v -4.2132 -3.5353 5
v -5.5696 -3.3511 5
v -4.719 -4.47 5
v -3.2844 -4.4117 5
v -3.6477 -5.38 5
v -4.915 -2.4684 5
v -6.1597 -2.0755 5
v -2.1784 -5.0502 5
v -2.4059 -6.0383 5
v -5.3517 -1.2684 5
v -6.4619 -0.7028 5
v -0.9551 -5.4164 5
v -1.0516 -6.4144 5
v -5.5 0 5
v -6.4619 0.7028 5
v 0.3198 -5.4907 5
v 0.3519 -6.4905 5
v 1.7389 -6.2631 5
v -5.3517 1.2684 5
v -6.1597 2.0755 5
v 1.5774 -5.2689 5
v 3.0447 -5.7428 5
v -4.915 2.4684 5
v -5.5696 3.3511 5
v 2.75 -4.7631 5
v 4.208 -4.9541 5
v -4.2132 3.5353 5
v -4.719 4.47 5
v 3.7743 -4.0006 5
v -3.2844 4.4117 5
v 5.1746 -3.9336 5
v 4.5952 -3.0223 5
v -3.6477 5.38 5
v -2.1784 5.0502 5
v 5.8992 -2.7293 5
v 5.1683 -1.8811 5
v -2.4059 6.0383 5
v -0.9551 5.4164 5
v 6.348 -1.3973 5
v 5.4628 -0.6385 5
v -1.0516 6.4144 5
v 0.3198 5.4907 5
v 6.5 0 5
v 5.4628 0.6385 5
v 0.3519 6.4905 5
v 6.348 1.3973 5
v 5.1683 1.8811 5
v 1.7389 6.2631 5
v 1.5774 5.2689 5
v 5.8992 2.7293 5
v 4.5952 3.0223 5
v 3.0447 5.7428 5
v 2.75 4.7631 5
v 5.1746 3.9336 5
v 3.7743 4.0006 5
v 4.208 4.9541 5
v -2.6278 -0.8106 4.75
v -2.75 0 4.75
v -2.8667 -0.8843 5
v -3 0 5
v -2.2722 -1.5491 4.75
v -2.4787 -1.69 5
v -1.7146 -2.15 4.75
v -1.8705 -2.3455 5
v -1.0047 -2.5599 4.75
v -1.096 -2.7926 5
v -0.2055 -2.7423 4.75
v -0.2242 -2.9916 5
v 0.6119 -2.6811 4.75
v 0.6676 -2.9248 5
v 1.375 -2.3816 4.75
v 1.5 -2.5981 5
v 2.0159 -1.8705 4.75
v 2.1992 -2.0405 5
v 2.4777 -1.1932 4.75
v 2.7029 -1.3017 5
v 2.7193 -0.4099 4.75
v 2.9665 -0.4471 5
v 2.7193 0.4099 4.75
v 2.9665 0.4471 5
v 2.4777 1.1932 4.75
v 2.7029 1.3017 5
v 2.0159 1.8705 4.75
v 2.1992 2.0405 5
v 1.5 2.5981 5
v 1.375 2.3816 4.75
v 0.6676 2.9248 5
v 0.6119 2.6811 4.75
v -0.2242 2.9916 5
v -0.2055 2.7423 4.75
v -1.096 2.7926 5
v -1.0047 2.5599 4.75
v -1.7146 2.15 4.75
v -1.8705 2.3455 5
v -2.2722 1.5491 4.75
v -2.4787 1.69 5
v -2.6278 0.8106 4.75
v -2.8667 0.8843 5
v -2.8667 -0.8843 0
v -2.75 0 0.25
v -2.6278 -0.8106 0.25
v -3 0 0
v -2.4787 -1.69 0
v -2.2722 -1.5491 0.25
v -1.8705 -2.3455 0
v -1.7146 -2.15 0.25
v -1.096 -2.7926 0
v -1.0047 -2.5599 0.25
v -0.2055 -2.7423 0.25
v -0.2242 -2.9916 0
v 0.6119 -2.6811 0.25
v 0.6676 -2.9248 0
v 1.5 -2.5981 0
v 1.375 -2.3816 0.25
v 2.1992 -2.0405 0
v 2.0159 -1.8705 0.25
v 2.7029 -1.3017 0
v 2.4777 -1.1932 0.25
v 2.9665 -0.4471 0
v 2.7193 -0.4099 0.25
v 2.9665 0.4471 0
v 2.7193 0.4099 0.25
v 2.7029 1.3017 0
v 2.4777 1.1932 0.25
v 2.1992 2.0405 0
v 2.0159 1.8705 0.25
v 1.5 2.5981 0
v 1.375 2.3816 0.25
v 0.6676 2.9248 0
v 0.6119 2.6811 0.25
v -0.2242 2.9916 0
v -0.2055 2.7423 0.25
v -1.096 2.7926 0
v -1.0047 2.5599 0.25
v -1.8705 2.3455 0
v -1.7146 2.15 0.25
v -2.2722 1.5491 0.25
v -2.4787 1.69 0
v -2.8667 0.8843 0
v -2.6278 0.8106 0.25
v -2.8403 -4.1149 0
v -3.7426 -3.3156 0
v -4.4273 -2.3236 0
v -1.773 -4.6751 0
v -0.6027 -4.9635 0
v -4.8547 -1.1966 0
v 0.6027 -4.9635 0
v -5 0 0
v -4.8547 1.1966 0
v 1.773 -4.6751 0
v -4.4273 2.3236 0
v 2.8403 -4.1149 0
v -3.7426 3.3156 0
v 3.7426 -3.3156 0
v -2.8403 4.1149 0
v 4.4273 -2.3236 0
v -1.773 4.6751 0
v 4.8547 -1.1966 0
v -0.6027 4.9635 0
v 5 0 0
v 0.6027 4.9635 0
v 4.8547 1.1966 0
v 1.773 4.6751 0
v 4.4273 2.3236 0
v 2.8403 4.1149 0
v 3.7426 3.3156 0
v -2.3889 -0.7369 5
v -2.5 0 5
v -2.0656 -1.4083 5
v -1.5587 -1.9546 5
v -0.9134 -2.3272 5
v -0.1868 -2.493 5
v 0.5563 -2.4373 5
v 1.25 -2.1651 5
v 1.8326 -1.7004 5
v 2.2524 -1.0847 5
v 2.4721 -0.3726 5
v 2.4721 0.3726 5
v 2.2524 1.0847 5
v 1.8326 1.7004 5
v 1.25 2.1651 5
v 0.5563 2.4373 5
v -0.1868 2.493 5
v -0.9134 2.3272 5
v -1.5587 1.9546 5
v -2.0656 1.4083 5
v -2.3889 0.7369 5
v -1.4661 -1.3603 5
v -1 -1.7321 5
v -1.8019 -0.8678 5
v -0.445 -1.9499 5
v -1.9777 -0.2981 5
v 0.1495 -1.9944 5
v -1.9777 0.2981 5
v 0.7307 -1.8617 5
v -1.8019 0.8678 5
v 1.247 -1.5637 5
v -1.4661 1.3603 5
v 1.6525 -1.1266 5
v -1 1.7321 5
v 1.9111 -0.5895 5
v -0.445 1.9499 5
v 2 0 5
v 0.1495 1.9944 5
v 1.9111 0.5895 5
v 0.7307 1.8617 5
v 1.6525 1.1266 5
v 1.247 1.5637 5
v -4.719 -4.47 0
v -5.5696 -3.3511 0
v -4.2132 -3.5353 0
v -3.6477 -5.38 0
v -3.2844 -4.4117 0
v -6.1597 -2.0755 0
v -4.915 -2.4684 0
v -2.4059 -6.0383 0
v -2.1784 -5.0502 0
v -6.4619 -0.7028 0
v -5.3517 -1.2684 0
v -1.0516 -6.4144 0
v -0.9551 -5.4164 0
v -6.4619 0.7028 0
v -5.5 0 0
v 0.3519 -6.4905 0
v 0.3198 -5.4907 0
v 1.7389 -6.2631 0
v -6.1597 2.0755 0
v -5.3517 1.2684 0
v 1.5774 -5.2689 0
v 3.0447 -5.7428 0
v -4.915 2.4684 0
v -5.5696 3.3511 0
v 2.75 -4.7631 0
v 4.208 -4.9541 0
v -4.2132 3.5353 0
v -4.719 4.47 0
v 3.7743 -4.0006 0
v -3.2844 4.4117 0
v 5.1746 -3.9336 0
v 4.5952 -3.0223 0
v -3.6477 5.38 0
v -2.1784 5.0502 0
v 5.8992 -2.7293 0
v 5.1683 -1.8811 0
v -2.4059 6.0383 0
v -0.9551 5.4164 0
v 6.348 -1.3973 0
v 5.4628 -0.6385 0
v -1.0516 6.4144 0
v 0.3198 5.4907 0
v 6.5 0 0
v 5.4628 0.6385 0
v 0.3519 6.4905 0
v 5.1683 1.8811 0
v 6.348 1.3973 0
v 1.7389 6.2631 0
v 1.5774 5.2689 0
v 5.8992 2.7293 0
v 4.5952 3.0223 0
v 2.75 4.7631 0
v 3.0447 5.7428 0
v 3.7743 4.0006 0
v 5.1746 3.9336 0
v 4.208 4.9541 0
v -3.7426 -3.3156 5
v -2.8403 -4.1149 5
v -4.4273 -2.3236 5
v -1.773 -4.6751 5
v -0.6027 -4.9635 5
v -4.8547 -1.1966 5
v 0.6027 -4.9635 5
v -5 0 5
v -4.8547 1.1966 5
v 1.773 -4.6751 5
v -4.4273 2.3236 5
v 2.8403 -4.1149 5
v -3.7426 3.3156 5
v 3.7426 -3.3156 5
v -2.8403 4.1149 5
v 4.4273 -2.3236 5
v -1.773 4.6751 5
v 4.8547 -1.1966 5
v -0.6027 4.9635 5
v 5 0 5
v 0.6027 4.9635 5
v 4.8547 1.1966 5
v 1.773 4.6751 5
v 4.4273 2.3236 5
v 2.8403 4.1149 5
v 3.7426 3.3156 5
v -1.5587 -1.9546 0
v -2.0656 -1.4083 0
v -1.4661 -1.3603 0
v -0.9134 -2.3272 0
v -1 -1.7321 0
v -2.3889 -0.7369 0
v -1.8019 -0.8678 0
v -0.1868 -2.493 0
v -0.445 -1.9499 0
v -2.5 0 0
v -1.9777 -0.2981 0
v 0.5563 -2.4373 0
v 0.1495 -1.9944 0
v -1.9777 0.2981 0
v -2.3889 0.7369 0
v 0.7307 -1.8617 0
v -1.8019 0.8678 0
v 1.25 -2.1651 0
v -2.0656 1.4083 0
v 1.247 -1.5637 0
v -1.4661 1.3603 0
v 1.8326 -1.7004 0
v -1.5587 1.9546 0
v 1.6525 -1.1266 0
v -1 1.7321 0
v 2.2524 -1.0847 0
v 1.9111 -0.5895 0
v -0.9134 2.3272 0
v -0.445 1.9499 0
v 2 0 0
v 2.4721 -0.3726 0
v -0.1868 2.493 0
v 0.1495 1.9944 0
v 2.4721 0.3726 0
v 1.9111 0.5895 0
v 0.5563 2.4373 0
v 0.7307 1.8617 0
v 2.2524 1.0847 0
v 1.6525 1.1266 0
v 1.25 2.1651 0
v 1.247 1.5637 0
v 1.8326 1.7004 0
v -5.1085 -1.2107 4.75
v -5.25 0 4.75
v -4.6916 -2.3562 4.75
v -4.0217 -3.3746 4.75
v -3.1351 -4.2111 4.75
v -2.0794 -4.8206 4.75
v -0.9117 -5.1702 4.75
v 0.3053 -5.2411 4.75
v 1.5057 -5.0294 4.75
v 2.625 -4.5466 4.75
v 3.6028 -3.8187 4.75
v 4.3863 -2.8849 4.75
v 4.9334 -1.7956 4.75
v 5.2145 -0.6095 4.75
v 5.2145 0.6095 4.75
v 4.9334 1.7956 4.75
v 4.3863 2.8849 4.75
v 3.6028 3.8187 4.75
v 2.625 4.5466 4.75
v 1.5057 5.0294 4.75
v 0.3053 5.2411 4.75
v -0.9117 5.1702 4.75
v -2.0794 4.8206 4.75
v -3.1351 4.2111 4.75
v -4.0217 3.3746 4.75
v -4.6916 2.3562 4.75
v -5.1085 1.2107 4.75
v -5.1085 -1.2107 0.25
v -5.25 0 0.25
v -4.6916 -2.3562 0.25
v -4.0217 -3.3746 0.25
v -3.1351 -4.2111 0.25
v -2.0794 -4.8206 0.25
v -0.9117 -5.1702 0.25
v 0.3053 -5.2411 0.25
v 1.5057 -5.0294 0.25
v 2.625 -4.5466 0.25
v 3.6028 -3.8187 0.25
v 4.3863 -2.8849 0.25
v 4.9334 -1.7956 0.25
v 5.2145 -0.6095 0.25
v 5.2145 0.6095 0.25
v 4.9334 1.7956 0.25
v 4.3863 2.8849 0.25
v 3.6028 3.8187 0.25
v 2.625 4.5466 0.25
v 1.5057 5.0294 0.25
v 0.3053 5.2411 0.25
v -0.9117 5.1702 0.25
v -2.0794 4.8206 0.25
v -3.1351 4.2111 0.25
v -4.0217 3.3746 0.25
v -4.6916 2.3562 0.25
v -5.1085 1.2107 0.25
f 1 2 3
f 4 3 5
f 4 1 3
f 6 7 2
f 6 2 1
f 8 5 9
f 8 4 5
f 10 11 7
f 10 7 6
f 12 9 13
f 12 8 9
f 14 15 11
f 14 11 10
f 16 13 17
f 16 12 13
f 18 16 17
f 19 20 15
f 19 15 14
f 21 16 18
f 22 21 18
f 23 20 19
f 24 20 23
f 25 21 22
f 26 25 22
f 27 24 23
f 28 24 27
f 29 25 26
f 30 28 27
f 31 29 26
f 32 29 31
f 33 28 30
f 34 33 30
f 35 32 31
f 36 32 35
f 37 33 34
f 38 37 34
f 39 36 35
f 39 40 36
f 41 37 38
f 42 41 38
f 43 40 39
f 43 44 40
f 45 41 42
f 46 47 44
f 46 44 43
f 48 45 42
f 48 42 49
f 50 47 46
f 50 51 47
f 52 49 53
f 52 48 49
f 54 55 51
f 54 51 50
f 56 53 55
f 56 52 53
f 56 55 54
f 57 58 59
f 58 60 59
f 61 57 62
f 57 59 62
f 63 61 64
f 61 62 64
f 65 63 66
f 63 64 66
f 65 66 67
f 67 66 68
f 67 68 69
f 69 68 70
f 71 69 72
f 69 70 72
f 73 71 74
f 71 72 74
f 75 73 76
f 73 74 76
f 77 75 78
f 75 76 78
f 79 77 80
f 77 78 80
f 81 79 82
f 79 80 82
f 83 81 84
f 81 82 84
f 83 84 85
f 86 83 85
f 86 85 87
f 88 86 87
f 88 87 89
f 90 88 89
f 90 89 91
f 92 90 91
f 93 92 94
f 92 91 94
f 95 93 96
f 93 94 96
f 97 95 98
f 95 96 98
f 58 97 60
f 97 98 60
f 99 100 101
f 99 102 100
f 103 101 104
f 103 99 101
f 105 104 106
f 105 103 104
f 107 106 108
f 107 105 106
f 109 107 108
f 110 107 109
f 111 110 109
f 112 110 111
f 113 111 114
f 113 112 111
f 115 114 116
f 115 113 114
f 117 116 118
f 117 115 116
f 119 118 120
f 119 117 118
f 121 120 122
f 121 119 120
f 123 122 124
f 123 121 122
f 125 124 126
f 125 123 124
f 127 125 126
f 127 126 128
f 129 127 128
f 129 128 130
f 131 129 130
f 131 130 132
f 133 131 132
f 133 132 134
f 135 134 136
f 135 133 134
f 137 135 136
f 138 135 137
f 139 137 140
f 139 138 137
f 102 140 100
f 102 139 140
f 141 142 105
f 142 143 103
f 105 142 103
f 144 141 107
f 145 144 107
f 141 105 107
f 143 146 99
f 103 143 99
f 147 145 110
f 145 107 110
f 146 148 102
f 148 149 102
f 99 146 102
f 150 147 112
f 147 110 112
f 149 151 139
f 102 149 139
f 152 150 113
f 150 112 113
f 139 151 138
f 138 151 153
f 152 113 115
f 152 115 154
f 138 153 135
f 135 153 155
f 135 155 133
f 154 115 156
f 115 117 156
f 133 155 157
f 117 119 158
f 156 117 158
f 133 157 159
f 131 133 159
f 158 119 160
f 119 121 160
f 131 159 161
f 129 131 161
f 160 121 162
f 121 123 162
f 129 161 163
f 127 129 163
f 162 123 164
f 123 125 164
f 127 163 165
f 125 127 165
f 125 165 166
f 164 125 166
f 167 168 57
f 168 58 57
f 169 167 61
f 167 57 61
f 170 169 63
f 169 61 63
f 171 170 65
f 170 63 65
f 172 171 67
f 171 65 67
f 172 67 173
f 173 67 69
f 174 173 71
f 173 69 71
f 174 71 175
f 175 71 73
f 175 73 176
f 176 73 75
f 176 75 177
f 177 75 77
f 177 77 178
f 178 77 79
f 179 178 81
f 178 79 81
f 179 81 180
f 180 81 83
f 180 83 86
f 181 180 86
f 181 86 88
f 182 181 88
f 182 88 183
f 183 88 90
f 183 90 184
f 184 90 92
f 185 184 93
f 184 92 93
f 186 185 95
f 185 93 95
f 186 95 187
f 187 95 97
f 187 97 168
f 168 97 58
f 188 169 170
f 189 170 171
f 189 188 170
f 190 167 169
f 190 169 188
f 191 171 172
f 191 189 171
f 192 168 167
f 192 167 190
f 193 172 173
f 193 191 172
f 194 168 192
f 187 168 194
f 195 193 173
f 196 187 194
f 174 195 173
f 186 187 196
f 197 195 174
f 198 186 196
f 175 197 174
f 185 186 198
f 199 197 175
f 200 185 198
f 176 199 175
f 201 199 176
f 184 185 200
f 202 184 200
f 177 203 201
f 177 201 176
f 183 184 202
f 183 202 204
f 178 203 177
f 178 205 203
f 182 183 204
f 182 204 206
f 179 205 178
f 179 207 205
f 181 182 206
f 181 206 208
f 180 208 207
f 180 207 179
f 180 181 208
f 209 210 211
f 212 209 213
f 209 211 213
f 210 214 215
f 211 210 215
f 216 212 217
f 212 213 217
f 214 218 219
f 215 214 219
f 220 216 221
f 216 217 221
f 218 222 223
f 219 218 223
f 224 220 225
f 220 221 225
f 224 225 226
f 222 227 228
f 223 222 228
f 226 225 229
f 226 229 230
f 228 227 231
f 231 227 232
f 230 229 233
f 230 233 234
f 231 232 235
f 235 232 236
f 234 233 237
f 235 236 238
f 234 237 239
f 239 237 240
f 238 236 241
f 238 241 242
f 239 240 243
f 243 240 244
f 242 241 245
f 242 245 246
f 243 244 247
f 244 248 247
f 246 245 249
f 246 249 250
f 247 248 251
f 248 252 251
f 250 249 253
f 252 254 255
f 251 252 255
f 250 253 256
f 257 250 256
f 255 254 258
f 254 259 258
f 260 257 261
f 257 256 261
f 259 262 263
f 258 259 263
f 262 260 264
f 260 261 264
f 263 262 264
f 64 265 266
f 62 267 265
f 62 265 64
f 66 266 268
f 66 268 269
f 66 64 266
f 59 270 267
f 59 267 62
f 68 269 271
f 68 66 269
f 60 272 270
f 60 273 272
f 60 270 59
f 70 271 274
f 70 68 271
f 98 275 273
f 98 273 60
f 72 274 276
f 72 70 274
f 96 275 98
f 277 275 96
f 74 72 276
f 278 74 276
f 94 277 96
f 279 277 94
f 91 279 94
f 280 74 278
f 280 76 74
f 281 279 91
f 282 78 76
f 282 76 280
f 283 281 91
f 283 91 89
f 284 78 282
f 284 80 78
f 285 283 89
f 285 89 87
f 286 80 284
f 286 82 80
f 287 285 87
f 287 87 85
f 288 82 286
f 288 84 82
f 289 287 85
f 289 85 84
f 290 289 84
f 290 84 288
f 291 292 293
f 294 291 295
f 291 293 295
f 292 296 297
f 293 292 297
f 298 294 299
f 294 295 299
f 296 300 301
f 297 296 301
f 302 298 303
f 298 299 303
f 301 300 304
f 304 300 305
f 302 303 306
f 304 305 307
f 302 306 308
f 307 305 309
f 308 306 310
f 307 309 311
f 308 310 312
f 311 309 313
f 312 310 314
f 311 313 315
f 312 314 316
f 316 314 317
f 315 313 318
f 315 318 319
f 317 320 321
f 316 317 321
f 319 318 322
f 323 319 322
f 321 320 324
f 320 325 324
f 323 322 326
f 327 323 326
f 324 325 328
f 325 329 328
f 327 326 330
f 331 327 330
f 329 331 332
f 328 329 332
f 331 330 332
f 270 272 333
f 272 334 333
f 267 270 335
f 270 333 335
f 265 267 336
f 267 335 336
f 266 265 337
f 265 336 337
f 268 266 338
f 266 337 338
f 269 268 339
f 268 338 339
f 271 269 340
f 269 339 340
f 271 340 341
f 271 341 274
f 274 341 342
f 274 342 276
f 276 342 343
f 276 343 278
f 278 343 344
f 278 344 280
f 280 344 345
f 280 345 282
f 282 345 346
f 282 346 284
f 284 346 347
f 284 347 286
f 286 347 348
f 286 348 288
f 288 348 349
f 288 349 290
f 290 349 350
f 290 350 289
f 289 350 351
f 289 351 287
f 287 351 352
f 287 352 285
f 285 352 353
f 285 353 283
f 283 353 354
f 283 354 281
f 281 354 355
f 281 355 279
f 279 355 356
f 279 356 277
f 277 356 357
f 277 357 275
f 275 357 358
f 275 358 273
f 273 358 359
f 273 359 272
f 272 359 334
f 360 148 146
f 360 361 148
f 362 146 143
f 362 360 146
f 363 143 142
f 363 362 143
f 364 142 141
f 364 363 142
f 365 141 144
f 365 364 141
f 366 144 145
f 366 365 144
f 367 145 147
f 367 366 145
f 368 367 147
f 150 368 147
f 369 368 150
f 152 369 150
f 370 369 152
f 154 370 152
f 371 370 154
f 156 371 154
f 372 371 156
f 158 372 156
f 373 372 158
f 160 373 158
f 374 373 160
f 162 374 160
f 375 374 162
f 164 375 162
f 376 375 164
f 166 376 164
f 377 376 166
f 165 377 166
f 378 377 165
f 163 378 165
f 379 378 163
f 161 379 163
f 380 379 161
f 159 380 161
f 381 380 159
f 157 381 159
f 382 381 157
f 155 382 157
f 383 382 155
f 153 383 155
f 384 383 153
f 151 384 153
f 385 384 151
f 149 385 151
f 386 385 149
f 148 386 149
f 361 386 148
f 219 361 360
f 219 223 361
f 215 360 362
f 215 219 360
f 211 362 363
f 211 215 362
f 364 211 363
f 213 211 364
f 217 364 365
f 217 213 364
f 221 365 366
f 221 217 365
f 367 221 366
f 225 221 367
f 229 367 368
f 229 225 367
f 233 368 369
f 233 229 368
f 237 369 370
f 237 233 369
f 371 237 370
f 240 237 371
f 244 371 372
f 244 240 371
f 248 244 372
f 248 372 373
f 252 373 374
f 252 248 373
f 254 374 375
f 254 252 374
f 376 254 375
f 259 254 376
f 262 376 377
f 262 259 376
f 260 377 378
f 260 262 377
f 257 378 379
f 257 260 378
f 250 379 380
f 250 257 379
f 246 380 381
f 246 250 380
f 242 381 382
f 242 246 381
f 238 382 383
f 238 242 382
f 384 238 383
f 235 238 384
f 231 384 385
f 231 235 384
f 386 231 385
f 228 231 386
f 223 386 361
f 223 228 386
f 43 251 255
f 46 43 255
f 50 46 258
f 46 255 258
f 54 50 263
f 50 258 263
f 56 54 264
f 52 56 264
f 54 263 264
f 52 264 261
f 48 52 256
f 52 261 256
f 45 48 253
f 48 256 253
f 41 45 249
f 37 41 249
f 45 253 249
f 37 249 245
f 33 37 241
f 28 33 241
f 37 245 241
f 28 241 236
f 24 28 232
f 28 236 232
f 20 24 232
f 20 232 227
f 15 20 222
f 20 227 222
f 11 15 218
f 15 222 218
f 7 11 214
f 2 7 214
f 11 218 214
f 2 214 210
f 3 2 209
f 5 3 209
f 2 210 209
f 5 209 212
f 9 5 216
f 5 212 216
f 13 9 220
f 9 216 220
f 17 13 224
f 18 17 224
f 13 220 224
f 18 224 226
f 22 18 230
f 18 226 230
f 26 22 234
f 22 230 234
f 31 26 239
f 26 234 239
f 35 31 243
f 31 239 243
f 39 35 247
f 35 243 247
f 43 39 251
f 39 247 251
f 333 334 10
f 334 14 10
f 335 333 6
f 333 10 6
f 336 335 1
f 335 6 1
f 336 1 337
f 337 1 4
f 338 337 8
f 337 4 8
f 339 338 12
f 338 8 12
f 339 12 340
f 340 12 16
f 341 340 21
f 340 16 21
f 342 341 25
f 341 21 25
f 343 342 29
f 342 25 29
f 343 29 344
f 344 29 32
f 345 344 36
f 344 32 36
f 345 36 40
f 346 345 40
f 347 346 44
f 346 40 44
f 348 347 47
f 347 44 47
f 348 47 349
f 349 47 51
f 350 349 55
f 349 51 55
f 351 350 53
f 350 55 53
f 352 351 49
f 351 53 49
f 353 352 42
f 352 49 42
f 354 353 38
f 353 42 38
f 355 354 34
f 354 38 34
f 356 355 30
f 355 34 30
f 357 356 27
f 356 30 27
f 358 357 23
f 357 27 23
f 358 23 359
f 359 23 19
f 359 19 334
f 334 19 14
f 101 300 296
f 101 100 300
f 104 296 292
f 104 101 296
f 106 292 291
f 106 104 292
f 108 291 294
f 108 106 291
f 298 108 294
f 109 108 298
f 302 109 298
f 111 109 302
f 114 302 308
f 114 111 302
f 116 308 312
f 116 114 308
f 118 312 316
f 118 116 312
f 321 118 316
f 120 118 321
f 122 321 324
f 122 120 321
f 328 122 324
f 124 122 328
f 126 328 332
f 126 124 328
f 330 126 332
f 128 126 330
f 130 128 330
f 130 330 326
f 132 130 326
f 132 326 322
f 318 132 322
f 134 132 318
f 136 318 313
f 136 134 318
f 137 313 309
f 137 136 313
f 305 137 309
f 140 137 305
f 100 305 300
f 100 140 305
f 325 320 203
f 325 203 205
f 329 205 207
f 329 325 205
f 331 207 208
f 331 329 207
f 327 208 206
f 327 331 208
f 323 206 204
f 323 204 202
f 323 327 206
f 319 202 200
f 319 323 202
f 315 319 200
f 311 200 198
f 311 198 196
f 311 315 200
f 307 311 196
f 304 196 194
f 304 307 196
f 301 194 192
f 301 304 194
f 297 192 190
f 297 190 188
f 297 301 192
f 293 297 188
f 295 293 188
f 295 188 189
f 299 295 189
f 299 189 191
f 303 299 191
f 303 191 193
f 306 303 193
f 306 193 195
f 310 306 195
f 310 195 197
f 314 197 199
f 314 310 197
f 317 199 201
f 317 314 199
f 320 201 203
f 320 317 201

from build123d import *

# Parameters (mm, degrees)
SKETCH1_R           = 6.5
SKETCH1_R_2         = 2
BOSS_EXTRUDE1_DEPTH = 5


with BuildPart() as part:
    # Sketch1 → Boss-Extrude1 (new body)
    with BuildSketch(Plane.XY):
        Circle(SKETCH1_R)
        Circle(SKETCH1_R_2, mode=Mode.SUBTRACT)
    extrude(amount=BOSS_EXTRUDE1_DEPTH)

    # Sketch2 → Cut-Revolve1 (revolve, cut)
    with BuildSketch(Plane(origin=(0, 0, 0), x_dir=(0, 0, -1), z_dir=(1, 0, 0)), mode=Mode.PRIVATE) as cut_revolve1_sk:
        Polygon((-5, 5.5), (-5, 5), (-4.75, 5.25), align=None)
        Polygon((-5, 3), (-5, 2.5), (-4.75, 2.75), align=None)
        Polygon((-0.25, 2.75), (0, 3), (0, 2.5), align=None)
        Polygon((-0.25, 5.25), (0, 5.5), (0, 5), align=None)
    revolve(cut_revolve1_sk.sketch.rotate(Axis((0, 0, 0), (0, 0, 1)), 90), axis=Axis((0, 0, 0), (0, 0, 1)), mode=Mode.SUBTRACT)


solid = part.part
